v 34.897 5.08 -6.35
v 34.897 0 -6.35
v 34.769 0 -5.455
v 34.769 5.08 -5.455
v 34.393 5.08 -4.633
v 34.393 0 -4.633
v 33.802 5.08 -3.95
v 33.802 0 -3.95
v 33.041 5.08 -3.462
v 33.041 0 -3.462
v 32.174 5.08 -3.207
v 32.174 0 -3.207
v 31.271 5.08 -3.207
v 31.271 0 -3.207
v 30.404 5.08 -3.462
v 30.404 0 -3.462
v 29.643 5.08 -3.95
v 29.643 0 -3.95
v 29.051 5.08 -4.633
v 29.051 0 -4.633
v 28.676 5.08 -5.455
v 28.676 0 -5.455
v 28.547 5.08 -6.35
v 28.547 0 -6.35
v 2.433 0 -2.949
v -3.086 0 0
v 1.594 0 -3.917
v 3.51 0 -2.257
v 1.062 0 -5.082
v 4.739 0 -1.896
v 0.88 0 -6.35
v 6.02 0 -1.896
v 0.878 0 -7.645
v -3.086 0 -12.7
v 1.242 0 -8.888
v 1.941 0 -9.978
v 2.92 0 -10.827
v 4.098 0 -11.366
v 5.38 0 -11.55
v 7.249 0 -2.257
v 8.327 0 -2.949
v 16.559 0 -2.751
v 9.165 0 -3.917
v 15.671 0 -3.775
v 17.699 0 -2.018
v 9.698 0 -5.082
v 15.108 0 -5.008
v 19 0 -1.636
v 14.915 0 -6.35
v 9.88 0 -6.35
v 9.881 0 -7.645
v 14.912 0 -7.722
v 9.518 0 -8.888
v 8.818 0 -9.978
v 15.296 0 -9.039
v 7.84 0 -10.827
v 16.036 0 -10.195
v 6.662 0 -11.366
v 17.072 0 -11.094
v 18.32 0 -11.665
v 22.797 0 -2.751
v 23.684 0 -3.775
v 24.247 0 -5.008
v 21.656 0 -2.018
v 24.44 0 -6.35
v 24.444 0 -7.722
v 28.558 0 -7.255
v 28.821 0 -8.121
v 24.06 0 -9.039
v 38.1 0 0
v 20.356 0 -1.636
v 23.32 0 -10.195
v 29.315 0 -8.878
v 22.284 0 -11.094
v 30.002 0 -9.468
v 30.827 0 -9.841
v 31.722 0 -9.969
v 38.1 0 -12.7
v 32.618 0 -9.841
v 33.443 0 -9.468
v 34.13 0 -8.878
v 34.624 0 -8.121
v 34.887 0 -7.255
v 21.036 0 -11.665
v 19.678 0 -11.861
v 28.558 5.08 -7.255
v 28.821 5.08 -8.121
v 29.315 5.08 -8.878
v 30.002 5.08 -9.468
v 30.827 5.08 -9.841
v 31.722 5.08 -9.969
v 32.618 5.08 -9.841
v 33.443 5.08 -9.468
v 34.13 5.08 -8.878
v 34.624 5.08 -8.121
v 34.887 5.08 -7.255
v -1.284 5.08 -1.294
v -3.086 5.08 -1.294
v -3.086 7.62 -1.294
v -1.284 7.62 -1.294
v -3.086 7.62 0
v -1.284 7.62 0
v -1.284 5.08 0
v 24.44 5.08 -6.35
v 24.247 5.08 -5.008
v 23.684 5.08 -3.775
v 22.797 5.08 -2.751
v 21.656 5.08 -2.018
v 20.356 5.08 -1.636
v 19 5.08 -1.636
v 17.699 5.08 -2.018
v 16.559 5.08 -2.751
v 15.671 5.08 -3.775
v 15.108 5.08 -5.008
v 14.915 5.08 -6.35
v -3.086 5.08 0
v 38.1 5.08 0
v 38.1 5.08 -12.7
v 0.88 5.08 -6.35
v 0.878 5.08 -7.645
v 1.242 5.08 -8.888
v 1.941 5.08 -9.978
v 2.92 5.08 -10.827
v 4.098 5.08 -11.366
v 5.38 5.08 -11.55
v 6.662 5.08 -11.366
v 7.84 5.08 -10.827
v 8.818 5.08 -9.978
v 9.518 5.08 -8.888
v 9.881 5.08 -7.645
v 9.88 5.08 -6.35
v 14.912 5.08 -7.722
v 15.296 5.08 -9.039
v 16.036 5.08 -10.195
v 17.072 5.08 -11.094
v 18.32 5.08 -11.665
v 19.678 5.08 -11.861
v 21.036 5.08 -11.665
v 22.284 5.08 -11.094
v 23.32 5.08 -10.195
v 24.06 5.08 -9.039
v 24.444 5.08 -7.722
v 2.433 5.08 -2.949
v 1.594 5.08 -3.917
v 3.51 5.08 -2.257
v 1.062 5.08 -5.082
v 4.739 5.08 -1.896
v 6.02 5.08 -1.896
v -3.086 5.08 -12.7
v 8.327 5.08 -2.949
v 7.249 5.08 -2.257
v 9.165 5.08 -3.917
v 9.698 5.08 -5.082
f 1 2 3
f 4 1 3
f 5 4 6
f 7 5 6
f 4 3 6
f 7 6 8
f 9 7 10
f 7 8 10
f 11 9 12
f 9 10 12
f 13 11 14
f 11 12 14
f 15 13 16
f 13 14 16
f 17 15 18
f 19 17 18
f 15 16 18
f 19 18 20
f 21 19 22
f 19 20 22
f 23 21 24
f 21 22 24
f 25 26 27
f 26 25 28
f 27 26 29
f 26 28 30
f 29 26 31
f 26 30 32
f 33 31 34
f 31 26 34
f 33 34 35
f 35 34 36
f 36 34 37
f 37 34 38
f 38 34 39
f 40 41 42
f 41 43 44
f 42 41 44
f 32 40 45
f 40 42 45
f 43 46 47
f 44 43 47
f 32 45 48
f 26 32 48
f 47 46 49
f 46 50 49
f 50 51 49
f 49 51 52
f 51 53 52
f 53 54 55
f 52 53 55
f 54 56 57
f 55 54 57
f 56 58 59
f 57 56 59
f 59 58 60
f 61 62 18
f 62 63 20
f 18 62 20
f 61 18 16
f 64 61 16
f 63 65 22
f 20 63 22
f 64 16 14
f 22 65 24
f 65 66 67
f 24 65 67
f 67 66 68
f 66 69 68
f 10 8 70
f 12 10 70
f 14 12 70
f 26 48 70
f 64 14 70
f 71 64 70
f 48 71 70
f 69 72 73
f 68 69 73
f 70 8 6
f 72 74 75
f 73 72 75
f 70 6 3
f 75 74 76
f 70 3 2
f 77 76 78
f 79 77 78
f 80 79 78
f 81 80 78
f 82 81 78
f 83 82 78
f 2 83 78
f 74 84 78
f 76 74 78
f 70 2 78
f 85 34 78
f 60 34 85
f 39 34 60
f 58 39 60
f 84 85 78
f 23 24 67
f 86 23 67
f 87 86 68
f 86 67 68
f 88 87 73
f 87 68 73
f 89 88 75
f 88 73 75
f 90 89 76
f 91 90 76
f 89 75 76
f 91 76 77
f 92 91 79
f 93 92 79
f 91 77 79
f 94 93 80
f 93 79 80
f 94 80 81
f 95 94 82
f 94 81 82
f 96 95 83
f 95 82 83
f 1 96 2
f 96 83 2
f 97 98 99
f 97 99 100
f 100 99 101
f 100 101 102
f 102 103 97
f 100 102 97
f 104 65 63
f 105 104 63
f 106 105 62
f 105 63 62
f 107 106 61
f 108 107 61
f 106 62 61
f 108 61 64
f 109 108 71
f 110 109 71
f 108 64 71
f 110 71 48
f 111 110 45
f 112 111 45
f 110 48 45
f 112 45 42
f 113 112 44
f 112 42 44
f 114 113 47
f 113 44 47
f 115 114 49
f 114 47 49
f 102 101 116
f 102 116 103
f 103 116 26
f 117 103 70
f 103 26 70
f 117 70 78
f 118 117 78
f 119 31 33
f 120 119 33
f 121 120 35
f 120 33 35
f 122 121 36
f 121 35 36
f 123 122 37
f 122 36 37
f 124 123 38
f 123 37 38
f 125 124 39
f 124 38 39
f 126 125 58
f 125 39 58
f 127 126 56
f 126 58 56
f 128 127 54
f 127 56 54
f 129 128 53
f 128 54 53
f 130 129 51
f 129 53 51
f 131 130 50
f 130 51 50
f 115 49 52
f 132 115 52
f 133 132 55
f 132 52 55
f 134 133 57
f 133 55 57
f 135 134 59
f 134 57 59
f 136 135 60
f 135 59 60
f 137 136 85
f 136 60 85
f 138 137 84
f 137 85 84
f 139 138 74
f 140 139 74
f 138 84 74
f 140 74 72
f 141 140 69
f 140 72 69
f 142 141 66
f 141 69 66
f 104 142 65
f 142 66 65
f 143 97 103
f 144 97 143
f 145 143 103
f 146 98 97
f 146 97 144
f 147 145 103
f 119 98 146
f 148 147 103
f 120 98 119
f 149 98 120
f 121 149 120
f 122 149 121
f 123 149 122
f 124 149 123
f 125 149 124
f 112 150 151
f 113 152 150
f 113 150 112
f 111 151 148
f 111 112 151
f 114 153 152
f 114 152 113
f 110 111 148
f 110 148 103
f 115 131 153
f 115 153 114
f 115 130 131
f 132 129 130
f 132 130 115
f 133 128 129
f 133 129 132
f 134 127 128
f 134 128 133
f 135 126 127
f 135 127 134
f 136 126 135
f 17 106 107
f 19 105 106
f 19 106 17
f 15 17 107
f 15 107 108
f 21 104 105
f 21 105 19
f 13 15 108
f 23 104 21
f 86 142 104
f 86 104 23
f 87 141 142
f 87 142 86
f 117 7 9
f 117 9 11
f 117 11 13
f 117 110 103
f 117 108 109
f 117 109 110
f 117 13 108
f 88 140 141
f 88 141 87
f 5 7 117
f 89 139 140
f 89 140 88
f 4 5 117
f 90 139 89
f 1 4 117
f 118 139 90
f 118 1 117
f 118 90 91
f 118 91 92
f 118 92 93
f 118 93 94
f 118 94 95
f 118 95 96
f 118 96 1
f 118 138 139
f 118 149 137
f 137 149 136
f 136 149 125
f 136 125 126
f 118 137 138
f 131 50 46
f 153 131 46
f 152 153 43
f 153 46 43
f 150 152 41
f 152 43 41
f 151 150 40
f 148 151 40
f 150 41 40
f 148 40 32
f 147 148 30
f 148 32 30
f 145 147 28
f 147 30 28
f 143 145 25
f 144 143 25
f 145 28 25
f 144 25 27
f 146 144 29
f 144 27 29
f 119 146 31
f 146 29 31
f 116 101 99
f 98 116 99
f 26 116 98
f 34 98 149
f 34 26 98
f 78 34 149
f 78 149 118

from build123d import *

# Parameters (mm, degrees)
SKETCH1_W           = 41.185763127
SKETCH1_H           = 12.7
BOSS_EXTRUDE1_DEPTH = 5.08
SKETCH3_W           = 1.801844016
SKETCH3_H           = 1.294077433
BOSS_EXTRUDE2_DEPTH = 2.54


with BuildPart() as part:
    # Sketch1 → Boss-Extrude1 (new body)
    with BuildSketch(Plane(origin=(0, 0, 0), x_dir=(1, 0, 0), z_dir=(0, 1, 0))):
        with Locations((17.507118437, 6.35)):
            Rectangle(SKETCH1_W, SKETCH1_H)
        with BuildLine():
            ThreePointArc((28.547464109, 6.35), (31.722464109, 9.968769047), (34.897464109, 6.35))
            ThreePointArc((34.897464109, 6.35), (31.722464109, 3.175), (28.547464109, 6.35))
        make_face(mode=Mode.SUBTRACT)
        with BuildLine():
            ThreePointArc((14.915366262, 6.35), (19.677866262, 11.860840795), (24.440366262, 6.35))
            ThreePointArc((24.440366262, 6.35), (19.677866262, 1.5875), (14.915366262, 6.35))
        make_face(mode=Mode.SUBTRACT)
        with BuildLine():
            ThreePointArc((0.879836225, 6.35), (5.379836225, 11.549994731), (9.879836225, 6.35))
            ThreePointArc((9.879836225, 6.35), (5.379836225, 1.85), (0.879836225, 6.35))
        make_face(mode=Mode.SUBTRACT)
    extrude(amount=BOSS_EXTRUDE1_DEPTH)

    # Sketch3 → Boss-Extrude2 (add)
    with BuildSketch(Plane(origin=(0, 5.08, 0), x_dir=(1, 0, 0), z_dir=(0, 1, 0))):
        with Locations((-2.184841119, 0.647038716)):
            Rectangle(SKETCH3_W, SKETCH3_H)
    extrude(amount=BOSS_EXTRUDE2_DEPTH)


solid = part.part
